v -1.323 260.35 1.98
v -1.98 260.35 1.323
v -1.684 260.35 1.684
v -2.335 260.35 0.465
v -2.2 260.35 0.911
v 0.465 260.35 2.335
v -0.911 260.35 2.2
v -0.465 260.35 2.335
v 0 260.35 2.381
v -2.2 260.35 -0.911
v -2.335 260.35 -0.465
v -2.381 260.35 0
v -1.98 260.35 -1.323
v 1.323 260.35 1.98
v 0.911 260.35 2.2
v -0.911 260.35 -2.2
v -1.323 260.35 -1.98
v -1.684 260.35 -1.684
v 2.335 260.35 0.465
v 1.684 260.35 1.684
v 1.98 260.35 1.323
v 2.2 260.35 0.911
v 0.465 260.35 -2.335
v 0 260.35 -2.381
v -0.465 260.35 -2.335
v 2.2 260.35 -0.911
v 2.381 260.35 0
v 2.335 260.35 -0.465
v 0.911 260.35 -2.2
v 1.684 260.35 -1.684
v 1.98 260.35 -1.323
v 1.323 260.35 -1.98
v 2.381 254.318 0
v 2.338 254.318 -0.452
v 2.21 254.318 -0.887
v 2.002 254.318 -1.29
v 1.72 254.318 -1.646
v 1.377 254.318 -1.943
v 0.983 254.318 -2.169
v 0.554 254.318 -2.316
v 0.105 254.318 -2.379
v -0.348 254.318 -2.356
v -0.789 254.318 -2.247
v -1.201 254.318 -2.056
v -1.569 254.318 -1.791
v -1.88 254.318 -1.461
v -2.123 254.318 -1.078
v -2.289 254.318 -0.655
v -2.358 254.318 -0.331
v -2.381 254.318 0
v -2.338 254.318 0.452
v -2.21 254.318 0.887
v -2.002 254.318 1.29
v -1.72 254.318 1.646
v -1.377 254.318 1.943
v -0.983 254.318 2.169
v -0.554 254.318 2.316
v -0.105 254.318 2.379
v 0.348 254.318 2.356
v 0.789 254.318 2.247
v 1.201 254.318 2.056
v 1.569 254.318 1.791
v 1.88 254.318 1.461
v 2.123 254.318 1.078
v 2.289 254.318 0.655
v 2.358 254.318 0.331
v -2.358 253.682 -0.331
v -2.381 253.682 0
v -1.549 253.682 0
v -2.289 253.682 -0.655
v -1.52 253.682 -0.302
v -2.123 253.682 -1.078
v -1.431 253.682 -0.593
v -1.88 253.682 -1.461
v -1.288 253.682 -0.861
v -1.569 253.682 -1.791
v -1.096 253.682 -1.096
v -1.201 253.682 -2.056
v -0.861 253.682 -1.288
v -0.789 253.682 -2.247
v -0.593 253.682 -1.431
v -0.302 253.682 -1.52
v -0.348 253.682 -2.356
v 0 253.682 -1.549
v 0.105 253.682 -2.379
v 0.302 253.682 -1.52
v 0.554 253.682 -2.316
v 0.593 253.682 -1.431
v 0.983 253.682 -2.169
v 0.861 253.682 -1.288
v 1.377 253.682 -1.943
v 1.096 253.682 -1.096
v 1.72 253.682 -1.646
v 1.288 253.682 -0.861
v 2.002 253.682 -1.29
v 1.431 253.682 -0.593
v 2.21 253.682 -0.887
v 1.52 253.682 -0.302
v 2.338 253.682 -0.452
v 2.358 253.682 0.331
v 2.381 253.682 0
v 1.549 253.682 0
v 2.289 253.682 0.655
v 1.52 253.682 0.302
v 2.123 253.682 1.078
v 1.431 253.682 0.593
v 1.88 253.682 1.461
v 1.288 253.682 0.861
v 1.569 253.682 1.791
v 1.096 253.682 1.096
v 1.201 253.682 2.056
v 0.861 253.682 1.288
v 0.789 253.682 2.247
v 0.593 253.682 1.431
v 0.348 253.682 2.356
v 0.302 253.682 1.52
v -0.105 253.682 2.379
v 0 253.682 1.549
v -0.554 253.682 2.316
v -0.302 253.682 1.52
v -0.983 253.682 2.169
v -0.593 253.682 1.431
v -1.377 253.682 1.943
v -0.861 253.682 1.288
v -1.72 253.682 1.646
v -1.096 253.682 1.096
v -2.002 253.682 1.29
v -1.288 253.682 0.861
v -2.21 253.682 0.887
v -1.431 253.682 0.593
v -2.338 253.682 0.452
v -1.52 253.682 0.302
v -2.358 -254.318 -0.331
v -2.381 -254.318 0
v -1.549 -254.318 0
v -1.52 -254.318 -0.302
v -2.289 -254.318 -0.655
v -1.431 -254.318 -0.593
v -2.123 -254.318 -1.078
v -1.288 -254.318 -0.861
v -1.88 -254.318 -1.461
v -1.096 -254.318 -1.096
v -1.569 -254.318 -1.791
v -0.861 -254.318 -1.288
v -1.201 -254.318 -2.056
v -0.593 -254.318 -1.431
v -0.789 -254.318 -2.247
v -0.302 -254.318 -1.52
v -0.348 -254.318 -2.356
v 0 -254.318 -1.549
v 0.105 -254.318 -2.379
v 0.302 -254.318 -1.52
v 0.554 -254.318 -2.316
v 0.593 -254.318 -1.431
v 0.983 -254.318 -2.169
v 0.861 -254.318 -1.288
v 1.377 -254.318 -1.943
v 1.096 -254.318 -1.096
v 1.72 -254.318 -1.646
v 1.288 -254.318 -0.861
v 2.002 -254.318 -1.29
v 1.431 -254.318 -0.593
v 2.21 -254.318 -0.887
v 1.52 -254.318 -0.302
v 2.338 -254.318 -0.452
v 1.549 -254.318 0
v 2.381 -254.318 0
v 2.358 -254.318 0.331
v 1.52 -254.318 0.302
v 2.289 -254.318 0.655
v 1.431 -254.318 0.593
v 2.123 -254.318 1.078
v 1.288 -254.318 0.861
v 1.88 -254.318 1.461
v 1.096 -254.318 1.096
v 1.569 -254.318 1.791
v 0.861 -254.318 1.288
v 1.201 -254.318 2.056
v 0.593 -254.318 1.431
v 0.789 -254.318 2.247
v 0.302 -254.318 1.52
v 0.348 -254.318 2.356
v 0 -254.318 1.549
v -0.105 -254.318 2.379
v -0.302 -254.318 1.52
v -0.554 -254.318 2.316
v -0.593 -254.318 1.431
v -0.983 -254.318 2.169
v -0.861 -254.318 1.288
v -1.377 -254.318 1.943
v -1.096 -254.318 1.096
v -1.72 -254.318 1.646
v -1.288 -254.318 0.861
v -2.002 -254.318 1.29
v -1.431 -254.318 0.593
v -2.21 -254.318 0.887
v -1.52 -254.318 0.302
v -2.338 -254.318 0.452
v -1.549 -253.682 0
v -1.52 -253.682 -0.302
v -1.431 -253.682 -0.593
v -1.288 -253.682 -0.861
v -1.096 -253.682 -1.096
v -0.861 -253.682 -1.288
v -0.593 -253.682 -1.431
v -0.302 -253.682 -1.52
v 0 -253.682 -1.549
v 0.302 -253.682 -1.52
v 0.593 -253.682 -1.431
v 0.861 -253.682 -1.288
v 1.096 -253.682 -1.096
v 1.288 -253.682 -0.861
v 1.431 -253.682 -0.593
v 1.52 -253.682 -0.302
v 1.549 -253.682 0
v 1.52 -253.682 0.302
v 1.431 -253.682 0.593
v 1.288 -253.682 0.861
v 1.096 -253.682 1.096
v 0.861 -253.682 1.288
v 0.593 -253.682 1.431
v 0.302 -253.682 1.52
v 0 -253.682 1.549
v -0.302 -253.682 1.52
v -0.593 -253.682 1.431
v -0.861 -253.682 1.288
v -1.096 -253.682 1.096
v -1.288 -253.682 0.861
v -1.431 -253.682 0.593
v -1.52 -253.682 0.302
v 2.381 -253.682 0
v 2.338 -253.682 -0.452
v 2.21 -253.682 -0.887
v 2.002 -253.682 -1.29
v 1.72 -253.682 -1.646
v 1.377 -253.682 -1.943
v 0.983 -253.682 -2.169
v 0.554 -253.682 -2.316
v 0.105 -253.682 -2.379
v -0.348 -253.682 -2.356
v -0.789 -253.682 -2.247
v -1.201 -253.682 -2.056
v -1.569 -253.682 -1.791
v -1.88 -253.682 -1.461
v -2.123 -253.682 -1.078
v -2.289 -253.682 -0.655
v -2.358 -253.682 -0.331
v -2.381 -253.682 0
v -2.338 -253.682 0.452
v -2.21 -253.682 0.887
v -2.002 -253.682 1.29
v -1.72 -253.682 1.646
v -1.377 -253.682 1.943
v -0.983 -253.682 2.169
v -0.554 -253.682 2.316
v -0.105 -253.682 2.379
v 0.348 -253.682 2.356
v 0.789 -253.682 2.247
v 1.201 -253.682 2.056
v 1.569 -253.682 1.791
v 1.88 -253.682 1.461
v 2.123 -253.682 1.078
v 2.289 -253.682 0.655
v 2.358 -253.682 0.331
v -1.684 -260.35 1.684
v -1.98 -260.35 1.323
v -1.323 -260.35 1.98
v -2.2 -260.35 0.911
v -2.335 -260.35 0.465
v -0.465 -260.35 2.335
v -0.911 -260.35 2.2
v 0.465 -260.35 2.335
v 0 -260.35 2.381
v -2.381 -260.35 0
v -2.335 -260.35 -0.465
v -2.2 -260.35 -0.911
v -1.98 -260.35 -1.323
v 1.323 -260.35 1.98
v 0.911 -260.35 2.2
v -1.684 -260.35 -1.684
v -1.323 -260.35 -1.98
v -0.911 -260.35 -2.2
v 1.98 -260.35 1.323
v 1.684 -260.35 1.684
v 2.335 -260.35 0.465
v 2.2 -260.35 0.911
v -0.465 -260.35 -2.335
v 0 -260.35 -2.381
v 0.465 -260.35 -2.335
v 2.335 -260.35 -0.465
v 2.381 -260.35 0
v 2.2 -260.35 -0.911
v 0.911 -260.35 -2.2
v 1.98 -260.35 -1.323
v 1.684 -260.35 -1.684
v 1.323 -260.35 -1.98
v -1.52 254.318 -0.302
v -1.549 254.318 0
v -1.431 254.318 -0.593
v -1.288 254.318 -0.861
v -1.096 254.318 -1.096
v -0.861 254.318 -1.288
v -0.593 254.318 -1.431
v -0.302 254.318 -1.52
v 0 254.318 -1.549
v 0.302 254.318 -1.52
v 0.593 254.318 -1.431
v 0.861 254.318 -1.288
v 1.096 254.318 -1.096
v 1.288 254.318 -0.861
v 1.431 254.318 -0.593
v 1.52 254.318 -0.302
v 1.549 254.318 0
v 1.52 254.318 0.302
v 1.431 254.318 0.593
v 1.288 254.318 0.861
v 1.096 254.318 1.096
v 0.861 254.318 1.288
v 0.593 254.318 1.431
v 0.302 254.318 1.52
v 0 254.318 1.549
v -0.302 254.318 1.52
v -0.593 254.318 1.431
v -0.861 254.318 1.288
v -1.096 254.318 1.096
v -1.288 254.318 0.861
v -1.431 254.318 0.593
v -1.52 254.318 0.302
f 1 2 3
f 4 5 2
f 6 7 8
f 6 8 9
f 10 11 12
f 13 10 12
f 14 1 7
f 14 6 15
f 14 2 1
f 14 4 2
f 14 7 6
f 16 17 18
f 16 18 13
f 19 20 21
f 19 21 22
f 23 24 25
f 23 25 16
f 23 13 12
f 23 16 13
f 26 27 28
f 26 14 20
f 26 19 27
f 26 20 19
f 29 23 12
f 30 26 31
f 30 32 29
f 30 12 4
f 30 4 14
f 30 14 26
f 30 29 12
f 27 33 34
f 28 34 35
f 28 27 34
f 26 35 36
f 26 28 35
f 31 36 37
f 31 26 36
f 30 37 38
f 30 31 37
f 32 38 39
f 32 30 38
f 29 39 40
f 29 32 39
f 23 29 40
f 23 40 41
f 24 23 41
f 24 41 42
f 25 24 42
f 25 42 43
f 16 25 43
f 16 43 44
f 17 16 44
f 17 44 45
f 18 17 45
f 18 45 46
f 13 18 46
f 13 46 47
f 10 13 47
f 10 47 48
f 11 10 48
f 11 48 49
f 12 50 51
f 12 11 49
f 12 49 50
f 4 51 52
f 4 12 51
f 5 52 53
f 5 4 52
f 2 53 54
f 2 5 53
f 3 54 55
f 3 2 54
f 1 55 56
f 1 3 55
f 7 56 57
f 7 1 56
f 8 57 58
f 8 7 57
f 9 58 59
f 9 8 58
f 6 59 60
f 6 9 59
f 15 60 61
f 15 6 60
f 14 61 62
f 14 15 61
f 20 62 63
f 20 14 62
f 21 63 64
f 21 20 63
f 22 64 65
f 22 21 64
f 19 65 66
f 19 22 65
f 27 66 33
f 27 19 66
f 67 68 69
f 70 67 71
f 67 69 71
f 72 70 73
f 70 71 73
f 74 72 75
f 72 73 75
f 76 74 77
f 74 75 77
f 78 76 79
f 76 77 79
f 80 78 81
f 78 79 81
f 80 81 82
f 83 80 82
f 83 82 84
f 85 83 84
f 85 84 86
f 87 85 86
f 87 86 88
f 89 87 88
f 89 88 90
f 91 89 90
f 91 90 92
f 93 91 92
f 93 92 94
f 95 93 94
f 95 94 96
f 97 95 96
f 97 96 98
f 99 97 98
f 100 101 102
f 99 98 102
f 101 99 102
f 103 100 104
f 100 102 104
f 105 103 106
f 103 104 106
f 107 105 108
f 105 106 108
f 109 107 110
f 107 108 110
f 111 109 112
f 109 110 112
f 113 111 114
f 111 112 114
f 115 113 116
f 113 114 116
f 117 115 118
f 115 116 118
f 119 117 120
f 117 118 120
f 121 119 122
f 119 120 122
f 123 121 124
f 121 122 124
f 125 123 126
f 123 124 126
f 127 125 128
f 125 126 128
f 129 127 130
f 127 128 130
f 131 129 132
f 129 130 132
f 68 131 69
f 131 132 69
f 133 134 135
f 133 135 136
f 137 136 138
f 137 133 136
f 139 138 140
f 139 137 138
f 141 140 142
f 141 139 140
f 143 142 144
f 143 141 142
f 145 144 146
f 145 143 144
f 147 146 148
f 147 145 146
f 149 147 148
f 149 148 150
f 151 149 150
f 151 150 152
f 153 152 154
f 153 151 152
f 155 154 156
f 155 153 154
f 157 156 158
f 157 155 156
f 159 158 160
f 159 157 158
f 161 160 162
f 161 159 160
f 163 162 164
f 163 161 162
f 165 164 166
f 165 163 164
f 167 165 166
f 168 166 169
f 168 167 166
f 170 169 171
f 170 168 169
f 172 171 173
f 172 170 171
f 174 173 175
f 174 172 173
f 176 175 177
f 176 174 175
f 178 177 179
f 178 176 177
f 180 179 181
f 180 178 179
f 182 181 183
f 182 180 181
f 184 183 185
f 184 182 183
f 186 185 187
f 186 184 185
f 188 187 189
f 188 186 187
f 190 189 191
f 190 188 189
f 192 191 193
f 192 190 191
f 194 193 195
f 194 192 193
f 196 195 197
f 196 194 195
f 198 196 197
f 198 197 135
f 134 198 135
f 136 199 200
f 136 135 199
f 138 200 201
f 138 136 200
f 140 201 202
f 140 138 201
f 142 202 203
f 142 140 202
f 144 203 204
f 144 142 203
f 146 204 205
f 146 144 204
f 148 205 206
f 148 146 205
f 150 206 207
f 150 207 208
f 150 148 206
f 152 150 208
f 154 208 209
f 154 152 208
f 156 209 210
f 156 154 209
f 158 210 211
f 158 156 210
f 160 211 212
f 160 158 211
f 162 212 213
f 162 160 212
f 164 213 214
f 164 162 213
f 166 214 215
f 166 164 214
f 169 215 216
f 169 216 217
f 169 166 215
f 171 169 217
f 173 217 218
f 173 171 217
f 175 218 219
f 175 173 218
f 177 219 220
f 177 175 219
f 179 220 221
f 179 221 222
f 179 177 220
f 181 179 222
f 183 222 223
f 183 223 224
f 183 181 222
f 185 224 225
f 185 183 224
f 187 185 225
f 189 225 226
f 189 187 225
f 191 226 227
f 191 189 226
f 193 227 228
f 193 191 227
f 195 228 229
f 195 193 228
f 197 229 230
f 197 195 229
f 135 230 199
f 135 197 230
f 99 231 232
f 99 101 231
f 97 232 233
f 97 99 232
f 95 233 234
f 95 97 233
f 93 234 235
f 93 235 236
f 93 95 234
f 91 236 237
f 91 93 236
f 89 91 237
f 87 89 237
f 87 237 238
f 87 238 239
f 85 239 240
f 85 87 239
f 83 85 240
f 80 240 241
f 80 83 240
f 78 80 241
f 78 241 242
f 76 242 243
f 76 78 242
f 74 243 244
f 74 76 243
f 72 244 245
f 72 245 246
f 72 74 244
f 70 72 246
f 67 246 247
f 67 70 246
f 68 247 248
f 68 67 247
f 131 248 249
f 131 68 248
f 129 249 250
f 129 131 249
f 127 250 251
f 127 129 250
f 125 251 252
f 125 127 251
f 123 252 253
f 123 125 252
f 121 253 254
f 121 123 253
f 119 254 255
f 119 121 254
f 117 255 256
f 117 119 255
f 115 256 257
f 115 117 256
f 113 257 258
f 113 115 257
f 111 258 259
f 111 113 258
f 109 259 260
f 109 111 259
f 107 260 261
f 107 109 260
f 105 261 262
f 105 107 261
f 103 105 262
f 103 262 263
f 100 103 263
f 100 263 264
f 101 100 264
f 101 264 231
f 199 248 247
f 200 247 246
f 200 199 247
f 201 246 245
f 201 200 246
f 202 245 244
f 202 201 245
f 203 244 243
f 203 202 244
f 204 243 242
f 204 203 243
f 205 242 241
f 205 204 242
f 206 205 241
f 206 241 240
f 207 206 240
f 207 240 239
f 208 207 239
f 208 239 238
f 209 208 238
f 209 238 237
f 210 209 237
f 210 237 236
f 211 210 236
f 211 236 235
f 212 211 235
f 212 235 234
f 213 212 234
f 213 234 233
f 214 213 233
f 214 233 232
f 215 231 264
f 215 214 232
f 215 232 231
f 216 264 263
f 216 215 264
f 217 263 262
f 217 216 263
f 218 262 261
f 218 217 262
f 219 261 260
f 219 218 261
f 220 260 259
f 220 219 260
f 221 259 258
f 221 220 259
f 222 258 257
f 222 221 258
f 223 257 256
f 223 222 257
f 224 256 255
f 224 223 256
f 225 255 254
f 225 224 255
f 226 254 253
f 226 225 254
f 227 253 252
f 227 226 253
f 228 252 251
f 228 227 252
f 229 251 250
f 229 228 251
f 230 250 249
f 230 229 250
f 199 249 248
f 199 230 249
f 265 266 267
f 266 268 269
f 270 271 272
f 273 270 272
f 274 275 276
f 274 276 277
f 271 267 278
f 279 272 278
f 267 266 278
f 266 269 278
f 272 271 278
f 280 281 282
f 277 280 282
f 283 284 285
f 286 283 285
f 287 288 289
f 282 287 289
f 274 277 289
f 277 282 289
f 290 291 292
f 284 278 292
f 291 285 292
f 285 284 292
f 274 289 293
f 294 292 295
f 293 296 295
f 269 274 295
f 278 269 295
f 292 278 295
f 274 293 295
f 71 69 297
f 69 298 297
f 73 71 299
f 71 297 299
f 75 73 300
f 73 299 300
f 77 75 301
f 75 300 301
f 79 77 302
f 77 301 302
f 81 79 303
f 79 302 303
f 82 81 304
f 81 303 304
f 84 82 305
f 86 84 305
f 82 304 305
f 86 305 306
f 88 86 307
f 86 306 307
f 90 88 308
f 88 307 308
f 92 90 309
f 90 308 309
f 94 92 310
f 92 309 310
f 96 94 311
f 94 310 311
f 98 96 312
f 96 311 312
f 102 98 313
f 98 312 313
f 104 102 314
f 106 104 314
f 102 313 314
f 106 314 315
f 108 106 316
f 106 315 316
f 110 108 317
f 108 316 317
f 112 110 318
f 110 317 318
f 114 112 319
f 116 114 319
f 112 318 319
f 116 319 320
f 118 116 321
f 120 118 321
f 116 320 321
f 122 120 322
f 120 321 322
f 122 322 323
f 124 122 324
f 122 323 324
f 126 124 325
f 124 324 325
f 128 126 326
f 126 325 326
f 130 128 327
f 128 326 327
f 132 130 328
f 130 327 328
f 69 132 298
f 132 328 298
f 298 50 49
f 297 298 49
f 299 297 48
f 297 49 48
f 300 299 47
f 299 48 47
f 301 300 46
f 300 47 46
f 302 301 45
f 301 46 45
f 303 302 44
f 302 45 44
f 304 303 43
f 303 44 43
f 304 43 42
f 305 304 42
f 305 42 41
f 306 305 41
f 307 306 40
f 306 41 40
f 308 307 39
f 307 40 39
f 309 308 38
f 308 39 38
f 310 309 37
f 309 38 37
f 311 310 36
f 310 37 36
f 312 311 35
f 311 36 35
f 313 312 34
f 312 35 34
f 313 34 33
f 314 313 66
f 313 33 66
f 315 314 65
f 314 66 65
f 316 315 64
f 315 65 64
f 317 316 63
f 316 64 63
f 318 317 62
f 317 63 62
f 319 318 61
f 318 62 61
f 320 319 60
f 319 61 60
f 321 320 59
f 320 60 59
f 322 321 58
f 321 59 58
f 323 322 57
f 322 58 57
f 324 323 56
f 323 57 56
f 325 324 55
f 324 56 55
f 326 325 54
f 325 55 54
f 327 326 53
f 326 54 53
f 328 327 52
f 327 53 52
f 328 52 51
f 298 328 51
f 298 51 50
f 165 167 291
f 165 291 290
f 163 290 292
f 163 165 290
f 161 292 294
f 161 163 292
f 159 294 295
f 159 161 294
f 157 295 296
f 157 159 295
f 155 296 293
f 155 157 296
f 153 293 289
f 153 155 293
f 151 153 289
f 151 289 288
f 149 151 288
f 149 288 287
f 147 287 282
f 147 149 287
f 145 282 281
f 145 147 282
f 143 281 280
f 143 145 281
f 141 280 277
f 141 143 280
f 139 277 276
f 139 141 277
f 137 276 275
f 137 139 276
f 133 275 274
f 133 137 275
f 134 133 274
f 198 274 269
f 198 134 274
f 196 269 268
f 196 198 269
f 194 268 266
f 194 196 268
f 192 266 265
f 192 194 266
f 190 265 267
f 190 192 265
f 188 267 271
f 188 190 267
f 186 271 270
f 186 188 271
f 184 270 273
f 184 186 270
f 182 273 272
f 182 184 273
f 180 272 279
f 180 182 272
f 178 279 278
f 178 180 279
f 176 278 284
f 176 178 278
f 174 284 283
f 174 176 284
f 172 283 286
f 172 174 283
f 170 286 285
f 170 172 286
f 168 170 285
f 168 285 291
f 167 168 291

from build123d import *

# Parameters (mm, degrees)
SKETCH1_R           = 2.38125
BOSS_EXTRUDE1_DEPTH = 260.35
SKETCH8_W           = 1.6637
SKETCH8_H           = 0.635


with BuildPart() as part:
    # Sketch1 → Boss-Extrude1 (new body, symmetric)
    with BuildSketch(Plane(origin=(0, 0, 0), x_dir=(1, 0, 0), z_dir=(0, 1, 0))):
        Circle(SKETCH1_R)
    extrude(amount=BOSS_EXTRUDE1_DEPTH, both=True)

    # Cut-Sweep1: sweep along a path in Sketch7
    with BuildLine(Plane(origin=(0, -254, 0), x_dir=(-1, 0, 0), z_dir=(0, -1, 0))) as cut_sweep1_path:
        CenterArc((0, 0), 2.38125, 0, 360)
    # Sketch8 → Cut-Sweep1 (sweep, cut)
    with BuildSketch(Plane(origin=(0, 0, 0), x_dir=(0, 0, -1), z_dir=(1, 0, 0))):
        with Locations((2.38125, -254)):
            Rectangle(SKETCH8_W, SKETCH8_H)
    cut_sweep1 = sweep(path=cut_sweep1_path.line, mode=Mode.SUBTRACT)

    # Mirror1: Cut-Sweep1 across plane
    add(cut_sweep1.mirror(Plane.ZX), mode=Mode.SUBTRACT)


solid = part.part
